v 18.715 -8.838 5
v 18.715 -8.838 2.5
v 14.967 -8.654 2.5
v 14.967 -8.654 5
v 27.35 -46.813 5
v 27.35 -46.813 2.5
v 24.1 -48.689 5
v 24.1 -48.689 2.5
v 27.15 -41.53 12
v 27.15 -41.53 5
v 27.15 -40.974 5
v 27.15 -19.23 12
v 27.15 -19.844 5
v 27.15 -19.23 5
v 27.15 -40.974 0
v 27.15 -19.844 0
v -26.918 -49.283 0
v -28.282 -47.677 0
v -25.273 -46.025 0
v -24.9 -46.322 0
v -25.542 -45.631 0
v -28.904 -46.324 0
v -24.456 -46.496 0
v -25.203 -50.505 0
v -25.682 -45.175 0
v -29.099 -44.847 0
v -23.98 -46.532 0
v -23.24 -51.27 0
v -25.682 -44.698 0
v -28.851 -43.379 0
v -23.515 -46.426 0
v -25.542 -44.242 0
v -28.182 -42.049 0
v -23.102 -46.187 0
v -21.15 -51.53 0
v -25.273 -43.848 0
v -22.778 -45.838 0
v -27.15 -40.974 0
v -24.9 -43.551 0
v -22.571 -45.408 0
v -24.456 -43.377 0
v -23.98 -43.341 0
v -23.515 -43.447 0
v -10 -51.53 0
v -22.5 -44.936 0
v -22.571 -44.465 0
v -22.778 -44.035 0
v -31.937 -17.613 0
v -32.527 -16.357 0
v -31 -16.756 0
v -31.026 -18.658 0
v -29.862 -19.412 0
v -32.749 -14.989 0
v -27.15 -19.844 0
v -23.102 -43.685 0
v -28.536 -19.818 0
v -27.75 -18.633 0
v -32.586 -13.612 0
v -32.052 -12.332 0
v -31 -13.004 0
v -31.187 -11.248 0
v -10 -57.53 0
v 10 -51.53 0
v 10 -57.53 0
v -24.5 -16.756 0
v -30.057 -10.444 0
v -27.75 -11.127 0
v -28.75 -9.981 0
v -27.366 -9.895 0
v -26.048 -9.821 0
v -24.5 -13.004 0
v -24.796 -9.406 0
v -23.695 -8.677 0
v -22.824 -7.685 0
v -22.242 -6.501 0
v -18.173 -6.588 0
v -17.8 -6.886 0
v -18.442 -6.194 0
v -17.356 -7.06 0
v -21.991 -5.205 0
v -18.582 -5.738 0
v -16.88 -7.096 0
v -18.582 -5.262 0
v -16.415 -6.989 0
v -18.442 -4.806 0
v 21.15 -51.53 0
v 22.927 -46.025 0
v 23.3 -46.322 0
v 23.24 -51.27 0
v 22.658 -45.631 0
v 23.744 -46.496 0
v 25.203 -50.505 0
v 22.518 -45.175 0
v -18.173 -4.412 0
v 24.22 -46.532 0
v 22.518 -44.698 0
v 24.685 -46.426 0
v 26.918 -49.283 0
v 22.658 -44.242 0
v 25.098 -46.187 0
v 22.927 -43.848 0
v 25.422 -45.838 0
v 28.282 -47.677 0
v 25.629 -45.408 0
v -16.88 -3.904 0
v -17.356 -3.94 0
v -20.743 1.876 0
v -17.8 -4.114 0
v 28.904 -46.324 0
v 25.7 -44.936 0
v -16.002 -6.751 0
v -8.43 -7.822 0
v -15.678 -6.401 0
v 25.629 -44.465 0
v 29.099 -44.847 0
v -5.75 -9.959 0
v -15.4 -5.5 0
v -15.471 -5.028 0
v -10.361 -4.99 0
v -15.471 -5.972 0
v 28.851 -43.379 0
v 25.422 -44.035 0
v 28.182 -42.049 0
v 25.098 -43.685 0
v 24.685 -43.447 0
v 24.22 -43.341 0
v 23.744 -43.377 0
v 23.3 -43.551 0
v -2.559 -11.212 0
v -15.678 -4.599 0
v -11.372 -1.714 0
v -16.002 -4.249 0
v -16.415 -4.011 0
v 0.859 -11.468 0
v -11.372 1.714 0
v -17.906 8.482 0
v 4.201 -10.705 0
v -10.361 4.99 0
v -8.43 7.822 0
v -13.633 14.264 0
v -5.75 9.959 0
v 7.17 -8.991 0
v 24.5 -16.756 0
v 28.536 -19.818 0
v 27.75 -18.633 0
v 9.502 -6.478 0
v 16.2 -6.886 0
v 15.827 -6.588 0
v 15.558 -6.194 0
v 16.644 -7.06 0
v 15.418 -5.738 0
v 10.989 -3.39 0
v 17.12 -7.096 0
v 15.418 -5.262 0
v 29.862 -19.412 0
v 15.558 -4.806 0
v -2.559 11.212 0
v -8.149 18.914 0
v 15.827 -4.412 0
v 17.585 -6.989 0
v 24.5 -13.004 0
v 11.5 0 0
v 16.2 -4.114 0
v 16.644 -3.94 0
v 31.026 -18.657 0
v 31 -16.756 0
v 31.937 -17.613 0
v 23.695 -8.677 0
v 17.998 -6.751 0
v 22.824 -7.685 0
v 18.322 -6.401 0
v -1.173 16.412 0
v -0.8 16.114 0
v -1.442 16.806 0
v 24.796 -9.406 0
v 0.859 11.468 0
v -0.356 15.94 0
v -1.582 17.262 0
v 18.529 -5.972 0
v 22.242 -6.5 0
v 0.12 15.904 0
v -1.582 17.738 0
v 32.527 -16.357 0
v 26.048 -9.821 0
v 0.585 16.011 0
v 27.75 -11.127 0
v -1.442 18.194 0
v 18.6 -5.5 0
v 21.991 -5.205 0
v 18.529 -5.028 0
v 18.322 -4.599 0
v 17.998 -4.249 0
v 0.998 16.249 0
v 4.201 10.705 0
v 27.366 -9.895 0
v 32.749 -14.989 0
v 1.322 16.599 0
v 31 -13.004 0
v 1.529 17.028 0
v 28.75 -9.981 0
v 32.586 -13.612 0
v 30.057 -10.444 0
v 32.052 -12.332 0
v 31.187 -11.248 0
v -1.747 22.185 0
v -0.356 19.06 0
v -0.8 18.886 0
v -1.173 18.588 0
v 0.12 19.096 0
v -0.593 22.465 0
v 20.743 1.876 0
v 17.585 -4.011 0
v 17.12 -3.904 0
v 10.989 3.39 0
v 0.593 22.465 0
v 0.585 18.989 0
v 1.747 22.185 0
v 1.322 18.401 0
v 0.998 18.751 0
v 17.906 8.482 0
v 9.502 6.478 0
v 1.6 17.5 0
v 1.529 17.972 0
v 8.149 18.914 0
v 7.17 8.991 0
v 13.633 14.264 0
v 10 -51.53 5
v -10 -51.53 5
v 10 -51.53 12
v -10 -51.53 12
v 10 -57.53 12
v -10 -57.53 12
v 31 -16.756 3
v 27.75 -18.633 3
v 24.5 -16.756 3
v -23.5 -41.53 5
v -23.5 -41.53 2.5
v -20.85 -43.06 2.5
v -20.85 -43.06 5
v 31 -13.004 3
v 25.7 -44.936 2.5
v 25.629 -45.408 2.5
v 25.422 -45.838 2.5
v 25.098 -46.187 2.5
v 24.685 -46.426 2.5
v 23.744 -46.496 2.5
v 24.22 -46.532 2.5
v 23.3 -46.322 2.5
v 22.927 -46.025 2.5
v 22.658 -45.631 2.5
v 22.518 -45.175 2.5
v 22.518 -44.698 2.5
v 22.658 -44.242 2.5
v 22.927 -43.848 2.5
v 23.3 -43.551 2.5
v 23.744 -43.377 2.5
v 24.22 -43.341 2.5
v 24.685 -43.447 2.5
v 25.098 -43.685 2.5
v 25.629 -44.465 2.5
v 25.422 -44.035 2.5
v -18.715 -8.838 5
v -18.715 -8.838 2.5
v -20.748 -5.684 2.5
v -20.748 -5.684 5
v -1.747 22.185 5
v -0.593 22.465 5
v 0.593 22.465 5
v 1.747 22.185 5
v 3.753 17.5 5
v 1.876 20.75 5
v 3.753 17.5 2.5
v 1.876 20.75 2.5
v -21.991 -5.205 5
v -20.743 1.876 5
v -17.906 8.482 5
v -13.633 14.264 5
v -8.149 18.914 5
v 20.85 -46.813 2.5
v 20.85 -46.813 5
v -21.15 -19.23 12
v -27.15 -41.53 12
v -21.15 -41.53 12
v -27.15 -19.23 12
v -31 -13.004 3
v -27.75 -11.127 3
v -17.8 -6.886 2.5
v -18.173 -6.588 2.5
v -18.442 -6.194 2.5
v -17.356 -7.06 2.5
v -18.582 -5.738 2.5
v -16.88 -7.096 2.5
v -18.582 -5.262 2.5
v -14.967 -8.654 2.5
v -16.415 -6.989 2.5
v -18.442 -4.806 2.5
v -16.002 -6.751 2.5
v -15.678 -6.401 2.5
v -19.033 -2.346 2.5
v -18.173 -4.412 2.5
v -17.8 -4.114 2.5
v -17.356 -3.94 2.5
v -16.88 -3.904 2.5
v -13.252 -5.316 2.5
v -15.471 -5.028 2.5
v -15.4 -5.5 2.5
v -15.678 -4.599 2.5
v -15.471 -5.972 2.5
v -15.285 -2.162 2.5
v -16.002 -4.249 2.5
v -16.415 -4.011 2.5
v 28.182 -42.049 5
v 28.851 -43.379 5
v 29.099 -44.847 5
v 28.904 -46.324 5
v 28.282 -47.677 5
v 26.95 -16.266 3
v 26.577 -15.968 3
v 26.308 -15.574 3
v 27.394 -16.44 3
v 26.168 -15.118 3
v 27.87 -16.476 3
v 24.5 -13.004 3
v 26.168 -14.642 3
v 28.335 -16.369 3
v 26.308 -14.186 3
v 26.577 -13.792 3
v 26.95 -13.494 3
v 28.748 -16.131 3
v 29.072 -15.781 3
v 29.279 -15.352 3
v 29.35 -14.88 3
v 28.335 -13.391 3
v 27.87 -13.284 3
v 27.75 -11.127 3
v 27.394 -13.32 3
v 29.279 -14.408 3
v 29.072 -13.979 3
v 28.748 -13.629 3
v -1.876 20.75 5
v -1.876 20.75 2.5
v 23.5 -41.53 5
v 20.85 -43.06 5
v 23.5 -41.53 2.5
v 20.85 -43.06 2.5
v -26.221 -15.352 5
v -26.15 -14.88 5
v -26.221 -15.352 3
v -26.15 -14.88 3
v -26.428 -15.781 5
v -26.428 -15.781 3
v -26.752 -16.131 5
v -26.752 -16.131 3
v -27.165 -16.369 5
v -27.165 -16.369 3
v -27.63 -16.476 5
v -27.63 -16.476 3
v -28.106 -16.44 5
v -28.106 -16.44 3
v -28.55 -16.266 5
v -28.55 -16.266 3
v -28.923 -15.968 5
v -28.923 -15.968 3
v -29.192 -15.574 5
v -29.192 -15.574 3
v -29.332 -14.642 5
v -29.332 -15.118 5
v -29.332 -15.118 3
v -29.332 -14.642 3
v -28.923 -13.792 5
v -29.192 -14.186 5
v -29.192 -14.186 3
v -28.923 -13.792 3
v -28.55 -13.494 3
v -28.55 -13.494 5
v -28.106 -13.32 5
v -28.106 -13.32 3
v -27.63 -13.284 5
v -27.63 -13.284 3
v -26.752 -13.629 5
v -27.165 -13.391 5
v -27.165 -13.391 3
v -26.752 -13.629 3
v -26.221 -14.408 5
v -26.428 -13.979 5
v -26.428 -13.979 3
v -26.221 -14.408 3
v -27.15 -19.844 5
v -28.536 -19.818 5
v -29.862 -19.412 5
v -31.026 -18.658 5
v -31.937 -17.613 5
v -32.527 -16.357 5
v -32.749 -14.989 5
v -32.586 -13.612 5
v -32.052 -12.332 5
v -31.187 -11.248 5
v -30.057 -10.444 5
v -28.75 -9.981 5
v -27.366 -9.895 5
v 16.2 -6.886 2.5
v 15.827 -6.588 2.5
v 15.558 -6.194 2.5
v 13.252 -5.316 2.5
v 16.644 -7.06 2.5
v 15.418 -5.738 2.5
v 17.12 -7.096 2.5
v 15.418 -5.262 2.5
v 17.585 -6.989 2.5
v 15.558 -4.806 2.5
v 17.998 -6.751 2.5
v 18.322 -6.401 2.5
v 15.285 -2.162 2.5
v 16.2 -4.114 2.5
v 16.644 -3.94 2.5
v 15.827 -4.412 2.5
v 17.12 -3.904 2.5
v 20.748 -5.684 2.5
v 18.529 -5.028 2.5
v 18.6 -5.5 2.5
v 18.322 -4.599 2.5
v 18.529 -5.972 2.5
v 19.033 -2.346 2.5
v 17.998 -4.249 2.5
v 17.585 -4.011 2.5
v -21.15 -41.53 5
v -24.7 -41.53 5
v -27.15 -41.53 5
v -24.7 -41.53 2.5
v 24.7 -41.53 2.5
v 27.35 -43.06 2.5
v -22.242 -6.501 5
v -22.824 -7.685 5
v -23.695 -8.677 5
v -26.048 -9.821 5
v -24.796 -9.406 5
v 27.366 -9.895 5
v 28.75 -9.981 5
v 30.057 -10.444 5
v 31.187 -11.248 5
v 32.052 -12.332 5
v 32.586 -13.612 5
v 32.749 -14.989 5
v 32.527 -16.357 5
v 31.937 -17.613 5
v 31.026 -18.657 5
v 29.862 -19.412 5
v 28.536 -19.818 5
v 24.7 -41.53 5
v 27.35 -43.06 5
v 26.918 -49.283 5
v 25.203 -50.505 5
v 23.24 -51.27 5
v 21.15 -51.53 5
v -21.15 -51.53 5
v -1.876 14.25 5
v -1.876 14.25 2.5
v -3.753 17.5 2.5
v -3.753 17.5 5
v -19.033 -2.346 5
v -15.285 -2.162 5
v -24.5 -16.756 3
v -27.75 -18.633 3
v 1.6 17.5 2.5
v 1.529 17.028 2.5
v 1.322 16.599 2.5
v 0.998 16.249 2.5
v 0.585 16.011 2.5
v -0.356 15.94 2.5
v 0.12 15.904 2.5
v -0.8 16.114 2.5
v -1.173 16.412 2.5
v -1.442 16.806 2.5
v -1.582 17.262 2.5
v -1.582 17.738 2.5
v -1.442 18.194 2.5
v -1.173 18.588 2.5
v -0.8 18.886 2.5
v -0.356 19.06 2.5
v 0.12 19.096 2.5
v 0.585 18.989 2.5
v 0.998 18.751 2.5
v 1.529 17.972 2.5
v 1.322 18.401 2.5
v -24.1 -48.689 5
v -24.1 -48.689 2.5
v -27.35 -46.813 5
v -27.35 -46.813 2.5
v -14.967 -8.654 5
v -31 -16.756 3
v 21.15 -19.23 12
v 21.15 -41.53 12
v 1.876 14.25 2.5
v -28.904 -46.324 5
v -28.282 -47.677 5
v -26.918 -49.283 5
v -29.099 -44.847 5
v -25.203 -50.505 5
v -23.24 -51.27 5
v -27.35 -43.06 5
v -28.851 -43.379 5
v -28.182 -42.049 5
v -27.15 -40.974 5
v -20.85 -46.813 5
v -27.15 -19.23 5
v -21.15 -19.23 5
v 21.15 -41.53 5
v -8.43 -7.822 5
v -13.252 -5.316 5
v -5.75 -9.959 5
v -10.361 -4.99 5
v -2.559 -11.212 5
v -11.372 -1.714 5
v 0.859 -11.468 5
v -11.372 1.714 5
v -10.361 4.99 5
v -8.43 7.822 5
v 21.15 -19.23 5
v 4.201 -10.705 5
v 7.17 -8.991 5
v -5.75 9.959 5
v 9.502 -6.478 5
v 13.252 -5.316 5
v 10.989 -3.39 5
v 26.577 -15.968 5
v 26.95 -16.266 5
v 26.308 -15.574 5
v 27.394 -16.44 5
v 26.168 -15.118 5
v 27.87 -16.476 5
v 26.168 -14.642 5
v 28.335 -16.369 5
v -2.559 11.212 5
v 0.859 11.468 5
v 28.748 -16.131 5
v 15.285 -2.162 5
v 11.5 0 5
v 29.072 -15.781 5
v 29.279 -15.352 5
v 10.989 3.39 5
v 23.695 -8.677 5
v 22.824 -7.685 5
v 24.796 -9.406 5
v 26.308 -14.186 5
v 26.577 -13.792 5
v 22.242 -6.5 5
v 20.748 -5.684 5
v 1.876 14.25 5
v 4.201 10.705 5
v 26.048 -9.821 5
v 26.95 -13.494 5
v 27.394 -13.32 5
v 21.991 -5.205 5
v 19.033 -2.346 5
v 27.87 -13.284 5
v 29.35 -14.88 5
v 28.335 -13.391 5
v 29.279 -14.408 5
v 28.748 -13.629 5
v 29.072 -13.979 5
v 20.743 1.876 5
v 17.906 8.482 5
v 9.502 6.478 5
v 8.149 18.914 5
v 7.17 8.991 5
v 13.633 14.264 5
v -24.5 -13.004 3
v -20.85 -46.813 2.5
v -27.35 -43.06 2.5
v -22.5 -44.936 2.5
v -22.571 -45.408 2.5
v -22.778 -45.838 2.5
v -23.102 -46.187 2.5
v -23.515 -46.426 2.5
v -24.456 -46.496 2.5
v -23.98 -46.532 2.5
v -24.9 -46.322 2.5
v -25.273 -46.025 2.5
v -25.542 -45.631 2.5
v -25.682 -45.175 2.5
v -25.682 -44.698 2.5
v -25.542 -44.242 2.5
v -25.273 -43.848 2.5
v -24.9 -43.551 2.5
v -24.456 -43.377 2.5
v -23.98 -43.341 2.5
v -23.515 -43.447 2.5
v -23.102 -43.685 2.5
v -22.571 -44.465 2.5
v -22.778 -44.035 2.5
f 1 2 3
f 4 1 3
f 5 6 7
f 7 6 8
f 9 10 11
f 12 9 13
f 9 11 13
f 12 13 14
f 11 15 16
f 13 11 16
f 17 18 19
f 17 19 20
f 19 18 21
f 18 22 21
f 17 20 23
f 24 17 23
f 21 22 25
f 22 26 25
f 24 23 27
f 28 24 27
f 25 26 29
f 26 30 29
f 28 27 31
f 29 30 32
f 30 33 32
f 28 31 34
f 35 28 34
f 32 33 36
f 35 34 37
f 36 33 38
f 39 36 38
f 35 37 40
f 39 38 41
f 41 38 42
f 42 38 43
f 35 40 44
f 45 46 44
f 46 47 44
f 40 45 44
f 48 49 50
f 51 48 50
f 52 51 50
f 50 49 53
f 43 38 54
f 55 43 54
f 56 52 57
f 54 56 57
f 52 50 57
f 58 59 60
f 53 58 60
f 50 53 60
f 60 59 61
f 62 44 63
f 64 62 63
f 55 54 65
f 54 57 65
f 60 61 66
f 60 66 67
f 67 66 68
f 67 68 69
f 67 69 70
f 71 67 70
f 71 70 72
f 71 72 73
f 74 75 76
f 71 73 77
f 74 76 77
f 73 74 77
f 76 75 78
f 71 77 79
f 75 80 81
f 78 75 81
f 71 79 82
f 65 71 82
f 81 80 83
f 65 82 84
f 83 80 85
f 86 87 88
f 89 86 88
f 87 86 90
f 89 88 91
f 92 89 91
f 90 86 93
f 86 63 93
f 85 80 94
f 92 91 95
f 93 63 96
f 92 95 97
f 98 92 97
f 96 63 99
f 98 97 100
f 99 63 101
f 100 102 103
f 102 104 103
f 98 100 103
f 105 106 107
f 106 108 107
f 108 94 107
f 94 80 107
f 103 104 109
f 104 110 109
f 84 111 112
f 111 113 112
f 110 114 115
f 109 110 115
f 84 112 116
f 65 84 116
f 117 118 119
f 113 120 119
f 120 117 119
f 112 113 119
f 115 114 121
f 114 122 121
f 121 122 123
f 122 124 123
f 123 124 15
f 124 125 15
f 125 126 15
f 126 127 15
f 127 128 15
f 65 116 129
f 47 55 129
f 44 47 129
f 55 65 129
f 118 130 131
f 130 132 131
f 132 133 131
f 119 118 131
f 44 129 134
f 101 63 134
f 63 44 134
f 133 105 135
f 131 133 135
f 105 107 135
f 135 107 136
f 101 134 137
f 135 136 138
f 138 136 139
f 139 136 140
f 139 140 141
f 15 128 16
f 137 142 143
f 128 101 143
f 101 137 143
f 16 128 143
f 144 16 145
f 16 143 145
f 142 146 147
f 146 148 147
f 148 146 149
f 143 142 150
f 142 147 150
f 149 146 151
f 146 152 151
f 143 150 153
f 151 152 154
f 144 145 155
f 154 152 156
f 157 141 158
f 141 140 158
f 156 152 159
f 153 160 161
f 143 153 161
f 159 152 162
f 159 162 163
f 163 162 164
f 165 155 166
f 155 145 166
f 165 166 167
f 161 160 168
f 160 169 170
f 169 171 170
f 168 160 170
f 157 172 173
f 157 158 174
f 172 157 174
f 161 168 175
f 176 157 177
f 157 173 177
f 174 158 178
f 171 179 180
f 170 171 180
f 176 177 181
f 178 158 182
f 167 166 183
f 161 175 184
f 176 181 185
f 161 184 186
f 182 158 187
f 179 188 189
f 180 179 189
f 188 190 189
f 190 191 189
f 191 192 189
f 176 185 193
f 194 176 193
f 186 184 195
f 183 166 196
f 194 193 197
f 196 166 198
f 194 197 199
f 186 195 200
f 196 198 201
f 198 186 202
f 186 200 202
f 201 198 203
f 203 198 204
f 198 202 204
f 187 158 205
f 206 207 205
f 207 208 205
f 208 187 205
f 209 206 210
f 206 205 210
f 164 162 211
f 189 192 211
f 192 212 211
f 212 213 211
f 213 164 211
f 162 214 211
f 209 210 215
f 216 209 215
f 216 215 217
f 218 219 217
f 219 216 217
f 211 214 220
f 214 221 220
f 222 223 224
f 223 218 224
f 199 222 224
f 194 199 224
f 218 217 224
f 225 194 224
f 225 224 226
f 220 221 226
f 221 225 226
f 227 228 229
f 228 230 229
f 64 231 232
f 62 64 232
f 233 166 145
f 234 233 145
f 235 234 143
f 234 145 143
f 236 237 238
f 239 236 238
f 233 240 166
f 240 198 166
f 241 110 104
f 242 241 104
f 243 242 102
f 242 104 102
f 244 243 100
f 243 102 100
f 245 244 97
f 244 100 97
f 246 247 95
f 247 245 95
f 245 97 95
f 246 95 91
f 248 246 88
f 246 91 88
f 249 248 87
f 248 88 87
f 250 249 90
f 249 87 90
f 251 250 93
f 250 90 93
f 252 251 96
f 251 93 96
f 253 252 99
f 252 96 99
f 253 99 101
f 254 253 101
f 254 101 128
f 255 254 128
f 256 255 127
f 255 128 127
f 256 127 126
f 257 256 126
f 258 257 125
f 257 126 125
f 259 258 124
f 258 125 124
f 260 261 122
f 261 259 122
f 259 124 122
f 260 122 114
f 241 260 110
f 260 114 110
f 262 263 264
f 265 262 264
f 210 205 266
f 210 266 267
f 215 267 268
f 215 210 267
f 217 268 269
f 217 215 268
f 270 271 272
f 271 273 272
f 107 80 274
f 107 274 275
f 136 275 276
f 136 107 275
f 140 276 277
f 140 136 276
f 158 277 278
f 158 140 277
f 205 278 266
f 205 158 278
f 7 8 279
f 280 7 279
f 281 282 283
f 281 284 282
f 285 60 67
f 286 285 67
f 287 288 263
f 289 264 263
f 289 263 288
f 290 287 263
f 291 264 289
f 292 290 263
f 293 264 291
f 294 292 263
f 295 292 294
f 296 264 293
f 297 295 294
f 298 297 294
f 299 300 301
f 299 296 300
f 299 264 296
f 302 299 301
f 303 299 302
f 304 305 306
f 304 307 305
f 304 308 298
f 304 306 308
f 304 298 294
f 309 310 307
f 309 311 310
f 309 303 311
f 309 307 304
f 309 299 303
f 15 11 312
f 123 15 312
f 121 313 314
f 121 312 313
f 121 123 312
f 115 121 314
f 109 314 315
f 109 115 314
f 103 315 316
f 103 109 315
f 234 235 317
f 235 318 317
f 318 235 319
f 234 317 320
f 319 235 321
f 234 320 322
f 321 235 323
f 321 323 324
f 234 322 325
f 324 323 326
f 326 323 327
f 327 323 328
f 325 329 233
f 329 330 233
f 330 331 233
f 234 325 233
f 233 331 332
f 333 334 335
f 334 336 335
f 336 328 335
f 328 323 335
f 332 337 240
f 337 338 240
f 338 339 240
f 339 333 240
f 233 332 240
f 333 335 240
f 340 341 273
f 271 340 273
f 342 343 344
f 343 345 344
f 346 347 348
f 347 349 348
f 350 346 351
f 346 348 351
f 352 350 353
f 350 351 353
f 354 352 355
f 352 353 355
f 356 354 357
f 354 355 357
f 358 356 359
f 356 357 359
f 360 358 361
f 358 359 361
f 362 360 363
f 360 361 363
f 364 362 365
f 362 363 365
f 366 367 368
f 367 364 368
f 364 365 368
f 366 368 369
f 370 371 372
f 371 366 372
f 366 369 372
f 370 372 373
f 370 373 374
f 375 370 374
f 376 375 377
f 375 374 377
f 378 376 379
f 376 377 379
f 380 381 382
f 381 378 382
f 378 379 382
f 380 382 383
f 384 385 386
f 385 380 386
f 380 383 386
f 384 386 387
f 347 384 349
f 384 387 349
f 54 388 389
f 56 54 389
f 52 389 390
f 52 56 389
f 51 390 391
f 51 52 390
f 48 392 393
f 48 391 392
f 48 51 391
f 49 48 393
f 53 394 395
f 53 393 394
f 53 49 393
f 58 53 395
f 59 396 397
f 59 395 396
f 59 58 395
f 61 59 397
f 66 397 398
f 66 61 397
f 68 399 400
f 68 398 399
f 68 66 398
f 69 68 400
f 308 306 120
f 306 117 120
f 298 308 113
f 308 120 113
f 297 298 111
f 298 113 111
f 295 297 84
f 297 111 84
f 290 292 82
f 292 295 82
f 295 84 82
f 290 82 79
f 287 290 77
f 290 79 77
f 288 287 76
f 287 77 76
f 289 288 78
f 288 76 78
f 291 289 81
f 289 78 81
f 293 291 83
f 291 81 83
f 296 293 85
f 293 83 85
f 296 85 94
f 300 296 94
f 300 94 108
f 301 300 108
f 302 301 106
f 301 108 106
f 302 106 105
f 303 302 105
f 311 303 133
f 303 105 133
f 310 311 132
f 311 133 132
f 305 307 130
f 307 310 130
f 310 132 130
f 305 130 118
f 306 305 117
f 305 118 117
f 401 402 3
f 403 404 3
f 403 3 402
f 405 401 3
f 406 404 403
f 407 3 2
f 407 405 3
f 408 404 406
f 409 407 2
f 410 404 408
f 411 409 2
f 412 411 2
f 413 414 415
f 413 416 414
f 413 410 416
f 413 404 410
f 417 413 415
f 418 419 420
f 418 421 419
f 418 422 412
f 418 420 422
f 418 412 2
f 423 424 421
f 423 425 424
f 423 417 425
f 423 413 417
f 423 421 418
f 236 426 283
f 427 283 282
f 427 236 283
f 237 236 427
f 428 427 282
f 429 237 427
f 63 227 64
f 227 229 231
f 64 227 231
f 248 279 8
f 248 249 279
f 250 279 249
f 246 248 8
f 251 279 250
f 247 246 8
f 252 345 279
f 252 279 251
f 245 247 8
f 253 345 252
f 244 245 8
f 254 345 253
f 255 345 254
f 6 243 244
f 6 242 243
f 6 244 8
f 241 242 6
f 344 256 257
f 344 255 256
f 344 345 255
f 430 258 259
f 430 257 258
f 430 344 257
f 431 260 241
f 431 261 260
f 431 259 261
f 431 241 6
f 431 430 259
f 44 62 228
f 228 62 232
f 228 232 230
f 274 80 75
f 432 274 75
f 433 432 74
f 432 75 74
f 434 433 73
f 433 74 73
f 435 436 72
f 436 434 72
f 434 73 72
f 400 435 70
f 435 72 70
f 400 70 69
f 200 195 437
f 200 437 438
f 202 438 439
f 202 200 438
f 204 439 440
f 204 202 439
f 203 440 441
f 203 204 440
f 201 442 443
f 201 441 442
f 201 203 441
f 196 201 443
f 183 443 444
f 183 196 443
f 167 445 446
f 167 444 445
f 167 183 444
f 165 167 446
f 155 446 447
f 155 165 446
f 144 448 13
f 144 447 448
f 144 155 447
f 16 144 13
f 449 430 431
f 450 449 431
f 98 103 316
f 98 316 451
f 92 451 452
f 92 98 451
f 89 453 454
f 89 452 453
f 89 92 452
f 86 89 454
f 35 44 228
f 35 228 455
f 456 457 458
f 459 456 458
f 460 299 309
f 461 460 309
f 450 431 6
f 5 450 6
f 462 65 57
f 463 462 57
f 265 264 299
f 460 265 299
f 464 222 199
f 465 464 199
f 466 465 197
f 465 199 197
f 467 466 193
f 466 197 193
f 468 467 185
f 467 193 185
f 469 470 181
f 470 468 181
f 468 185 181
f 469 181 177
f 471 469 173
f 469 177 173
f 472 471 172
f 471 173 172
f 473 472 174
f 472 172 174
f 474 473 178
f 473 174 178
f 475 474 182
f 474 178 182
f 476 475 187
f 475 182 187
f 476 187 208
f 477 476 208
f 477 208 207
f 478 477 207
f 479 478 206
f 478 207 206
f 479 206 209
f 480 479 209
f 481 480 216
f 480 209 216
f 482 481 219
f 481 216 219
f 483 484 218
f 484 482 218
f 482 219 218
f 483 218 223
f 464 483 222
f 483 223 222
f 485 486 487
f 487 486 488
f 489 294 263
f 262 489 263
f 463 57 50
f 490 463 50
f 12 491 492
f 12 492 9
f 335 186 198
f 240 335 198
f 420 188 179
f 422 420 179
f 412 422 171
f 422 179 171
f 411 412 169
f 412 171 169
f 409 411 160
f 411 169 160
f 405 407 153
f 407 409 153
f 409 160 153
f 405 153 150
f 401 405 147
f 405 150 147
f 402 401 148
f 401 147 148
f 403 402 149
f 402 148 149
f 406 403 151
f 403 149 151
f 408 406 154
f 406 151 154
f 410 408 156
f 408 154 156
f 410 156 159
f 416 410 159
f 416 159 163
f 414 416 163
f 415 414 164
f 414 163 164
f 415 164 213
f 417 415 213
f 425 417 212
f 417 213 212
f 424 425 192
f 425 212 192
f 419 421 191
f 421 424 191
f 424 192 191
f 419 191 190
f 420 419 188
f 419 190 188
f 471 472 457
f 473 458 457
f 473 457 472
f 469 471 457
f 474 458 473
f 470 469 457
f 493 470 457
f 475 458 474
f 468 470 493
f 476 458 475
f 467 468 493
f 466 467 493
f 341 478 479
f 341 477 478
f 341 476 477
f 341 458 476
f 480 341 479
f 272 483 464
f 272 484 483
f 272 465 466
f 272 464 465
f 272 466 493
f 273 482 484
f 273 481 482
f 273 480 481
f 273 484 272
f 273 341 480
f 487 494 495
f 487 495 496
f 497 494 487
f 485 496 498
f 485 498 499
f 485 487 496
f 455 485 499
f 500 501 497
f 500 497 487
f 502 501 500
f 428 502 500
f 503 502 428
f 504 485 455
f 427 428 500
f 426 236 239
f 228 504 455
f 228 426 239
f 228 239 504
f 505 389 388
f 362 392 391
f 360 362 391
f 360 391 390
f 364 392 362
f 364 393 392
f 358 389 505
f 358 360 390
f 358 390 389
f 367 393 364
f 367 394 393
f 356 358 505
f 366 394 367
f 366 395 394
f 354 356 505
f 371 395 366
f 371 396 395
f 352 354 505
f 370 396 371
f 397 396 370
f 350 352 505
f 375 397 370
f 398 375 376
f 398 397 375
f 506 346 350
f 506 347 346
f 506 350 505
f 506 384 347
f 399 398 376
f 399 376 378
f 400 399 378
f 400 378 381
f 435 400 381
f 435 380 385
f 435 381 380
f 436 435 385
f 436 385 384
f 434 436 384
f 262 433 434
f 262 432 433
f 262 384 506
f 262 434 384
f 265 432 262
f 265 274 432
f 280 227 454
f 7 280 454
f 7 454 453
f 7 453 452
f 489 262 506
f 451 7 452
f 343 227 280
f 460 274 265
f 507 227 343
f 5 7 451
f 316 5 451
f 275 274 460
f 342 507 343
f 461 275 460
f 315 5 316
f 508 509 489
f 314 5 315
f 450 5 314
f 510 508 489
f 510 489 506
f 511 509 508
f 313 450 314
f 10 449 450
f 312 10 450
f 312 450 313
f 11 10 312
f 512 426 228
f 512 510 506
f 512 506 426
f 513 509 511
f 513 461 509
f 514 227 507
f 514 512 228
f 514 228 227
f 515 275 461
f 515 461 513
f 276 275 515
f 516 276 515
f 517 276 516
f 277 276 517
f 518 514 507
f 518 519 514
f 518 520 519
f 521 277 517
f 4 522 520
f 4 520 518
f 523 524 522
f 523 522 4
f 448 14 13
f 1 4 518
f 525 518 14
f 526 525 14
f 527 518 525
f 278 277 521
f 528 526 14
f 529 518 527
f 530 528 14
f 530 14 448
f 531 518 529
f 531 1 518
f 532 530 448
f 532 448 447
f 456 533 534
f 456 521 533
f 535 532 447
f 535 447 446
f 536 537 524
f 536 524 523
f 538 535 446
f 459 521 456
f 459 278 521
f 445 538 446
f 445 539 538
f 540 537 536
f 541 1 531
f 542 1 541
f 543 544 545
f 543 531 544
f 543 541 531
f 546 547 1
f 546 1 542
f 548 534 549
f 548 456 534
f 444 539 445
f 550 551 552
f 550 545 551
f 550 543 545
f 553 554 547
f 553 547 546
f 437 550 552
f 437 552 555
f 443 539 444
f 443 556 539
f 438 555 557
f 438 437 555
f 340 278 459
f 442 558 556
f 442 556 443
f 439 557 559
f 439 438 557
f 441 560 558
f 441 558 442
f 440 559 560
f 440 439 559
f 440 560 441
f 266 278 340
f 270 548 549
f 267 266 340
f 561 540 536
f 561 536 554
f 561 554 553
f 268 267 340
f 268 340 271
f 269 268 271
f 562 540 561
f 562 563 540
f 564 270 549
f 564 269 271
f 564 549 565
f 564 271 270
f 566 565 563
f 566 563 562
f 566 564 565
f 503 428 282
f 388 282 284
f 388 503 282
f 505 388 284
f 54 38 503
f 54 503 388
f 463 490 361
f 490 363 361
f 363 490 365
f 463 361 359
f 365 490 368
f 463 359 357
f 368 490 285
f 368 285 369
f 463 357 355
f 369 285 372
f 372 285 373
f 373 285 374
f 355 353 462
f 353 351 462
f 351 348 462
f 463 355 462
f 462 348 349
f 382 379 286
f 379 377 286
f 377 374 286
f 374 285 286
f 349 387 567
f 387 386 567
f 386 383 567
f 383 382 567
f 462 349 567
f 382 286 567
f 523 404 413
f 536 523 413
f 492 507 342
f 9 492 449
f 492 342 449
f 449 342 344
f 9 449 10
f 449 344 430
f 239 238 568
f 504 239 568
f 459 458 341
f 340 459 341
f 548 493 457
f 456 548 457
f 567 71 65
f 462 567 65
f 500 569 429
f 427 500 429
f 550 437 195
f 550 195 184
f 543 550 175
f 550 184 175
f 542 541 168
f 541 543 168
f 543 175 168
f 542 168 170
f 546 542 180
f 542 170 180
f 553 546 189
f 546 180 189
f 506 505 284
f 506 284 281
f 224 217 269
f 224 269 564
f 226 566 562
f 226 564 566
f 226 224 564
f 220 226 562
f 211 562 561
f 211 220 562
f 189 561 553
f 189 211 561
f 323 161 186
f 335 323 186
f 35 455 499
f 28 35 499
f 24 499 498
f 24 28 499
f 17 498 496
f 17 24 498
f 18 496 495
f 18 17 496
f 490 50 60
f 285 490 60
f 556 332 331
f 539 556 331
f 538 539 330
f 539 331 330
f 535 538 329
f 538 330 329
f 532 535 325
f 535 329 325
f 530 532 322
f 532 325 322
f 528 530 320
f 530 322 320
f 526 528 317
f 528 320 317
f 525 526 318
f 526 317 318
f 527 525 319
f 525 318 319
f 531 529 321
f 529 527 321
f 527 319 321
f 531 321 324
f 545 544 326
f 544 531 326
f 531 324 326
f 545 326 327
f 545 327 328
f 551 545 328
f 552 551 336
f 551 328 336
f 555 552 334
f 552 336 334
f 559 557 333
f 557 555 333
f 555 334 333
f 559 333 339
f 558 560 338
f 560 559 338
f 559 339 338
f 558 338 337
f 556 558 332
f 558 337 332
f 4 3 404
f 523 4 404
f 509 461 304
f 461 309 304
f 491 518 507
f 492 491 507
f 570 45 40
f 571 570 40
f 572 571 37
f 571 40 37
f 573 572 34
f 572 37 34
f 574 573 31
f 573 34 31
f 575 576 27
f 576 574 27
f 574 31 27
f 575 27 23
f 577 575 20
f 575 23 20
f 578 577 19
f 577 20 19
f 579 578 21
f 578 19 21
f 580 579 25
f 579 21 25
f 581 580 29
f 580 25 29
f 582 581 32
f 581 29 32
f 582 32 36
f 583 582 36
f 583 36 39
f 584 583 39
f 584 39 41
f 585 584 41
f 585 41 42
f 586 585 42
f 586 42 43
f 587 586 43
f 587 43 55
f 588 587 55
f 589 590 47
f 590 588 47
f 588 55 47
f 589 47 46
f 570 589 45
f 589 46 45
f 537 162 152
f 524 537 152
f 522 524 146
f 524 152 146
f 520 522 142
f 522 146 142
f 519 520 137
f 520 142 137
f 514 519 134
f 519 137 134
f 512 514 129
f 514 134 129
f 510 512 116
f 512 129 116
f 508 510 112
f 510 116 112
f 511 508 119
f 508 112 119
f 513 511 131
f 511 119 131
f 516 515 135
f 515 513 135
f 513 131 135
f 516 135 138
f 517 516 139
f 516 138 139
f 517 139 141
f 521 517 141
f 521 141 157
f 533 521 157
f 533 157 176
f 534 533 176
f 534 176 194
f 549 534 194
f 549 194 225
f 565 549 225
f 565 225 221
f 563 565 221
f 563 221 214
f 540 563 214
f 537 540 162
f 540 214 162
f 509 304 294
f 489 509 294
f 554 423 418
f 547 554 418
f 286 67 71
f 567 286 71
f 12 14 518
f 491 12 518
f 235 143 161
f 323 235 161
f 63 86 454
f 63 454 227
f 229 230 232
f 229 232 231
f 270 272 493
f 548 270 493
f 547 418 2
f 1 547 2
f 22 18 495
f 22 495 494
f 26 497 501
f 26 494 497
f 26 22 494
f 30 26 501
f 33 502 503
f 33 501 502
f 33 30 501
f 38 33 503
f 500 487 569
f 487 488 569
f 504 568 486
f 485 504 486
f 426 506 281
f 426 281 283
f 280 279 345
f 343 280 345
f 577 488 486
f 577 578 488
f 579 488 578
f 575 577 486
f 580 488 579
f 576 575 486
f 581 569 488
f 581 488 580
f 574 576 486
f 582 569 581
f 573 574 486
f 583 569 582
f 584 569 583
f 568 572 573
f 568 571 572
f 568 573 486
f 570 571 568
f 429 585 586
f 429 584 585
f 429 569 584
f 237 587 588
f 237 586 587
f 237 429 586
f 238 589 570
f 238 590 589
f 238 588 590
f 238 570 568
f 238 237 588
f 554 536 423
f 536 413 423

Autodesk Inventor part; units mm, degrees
ref_plane "YZ Plane" through (0, 0, 0) normal (1, 0, 0) x (0, 1, 0)
ref_plane "XZ Plane" through (0, 0, 0) normal (0, 1, 0) x (-1, 0, 0)
ref_plane "XY Plane" through (0, 0, 0) normal (0, 0, 1) x (1, 0, 0)
sketch "Sketch1" plane through (0, 0, 0) normal (0, 0, 1) x (1, 0, 0)
  circle A0 centre (0, 0) radius 11.5
  line L0 (21.15, -51.53) -> (-21.15, -51.53) construction
  line L1 (-21.15, -51.53) -> (-21.15, -9.23) construction
  line L2 (-21.15, -9.23) -> (21.15, -9.23) construction
  line L3 (21.15, -9.23) -> (21.15, -51.53) construction
  circle A1 centre (0, 17.5) radius 1.6
  circle A2 centre (17, -5.5) radius 1.6
  circle A3 centre (-17, -5.5) radius 1.6
  line L4 (13.2517, -5.3162) -> (15.2851, -2.162)
  line L5 (15.2851, -2.162) -> (19.0333, -2.3458)
  line L6 (19.0333, -2.3458) -> (20.7483, -5.6838)
  line L7 (20.7483, -5.6838) -> (18.7149, -8.838)
  line L8 (18.7149, -8.838) -> (14.9667, -8.6542)
  line L9 (14.9667, -8.6542) -> (13.2517, -5.3162)
  line L10 (-14.9667, -8.6542) -> (-18.7149, -8.838)
  line L11 (-18.7149, -8.838) -> (-20.7483, -5.6838)
  line L12 (-20.7483, -5.6838) -> (-19.0333, -2.3458)
  line L13 (-19.0333, -2.3458) -> (-15.2851, -2.162)
  line L14 (-15.2851, -2.162) -> (-13.2517, -5.3162)
  line L15 (-13.2517, -5.3162) -> (-14.9667, -8.6542)
  line L16 (-1.8764, 14.25) -> (-3.7528, 17.5)
  line L17 (-3.7528, 17.5) -> (-1.8764, 20.75)
  line L18 (-1.8764, 20.75) -> (1.8764, 20.75)
  line L19 (1.8764, 20.75) -> (3.7528, 17.5)
  line L20 (3.7528, 17.5) -> (1.8764, 14.25)
  line L21 (1.8764, 14.25) -> (-1.8764, 14.25)
  line L22 (0, 0) -> (0, 17.5) construction
  line L23 (14.9667, -8.6542) -> (14.9667, -9.23) construction
  line L24 (13.2517, -5.3162) -> (12.7488, -5.0358) construction
  line L25 (21.15, -41.53) -> (27.15, -41.53)
  line L26 (27.15, -41.53) -> (27.15, -19.23)
  line L27 (27.15, -19.23) -> (21.15, -19.23)
  line L28 (21.15, -19.23) -> (21.15, -41.53)
  line L29 (-21.15, -41.53) -> (-27.15, -41.53)
  line L30 (-27.15, -41.53) -> (-27.15, -19.23)
  line L31 (-27.15, -19.23) -> (-21.15, -19.23)
  line L32 (-21.15, -19.23) -> (-21.15, -41.53)
  circle A4 centre (27.75, -14.88) radius 1.6
  circle A5 centre (-27.75, -14.88) radius 1.6
  line L33 (24.5, -16.7564) -> (24.5, -13.0036)
  line L34 (24.5, -13.0036) -> (27.75, -11.1272)
  line L35 (27.75, -11.1272) -> (31, -13.0036)
  line L36 (31, -13.0036) -> (31, -16.7564)
  line L37 (31, -16.7564) -> (27.75, -18.6328)
  line L38 (27.75, -18.6328) -> (24.5, -16.7564)
  line L39 (-27.75, -18.6328) -> (-31, -16.7564)
  line L40 (-31, -16.7564) -> (-31, -13.0036)
  line L41 (-31, -13.0036) -> (-27.75, -11.1272)
  line L42 (-27.75, -11.1272) -> (-24.5, -13.0036)
  line L43 (-24.5, -13.0036) -> (-24.5, -16.7564)
  line L44 (-24.5, -16.7564) -> (-27.75, -18.6328)
  circle A6 centre (-24.1, -44.9364) radius 1.6
  circle A7 centre (24.1, -44.9364) radius 1.6
  line L45 (-24.1, -48.6891) -> (-27.35, -46.8128)
  line L46 (-27.35, -46.8128) -> (-27.35, -43.06)
  line L47 (-27.35, -43.06) -> (-24.1, -41.1836)
  line L48 (-24.1, -41.1836) -> (-20.85, -43.06)
  line L49 (-20.85, -43.06) -> (-20.85, -46.8128)
  line L50 (-20.85, -46.8128) -> (-24.1, -48.6891)
  line L51 (24.1, -48.6891) -> (20.85, -46.8128)
  line L52 (20.85, -46.8128) -> (20.85, -43.06)
  line L53 (20.85, -43.06) -> (24.1, -41.1836)
  line L54 (24.1, -41.1836) -> (27.35, -43.06)
  line L55 (27.35, -43.06) -> (27.35, -46.8128)
  line L56 (27.35, -46.8128) -> (24.1, -48.6891)
  arc A8 (-27.3663, -9.8947) -> (-27.15, -19.8439) centre (-27.75, -14.88) ccw
  arc A9 (27.15, -19.8439) -> (27.3663, -9.8947) centre (27.75, -14.88) ccw
  arc A10 (-27.15, -40.9744) -> (-28.2818, -47.6773) centre (-24.1, -44.9364) ccw
  arc A11 (28.2818, -47.6773) -> (27.15, -40.9744) centre (24.1, -44.9364) ccw
  line L57 (21.15, -48.9734) -> (21.15, -51.53)
  line L58 (21.15, -51.53) -> (-21.15, -51.53)
  line L59 (-21.15, -51.53) -> (-21.15, -48.9734)
  arc A12 (1.7467, 22.185) -> (-1.7467, 22.185) centre (0, 17.5) ccw
  arc A13 (-27.3663, -9.8947) -> (-21.9913, -5.2047) centre (-26.9825, -4.9095) ccw
  arc A14 (21.9913, -5.2047) -> (27.3663, -9.8947) centre (26.9825, -4.9095) ccw
  arc A15 (21.15, -51.53) -> (28.2818, -47.6773) centre (21.15, -43.0028) ccw
  arc A16 (-28.2818, -47.6773) -> (-21.15, -51.53) centre (-21.15, -43.0028) ccw
  arc A17 (-1.7467, 22.185) -> (-21.9913, -5.2047) centre (9.1518, -7.047) ccw
  arc A18 (21.9913, -5.2047) -> (1.7467, 22.185) centre (-9.1518, -7.047) ccw
  dimension "d1" = 23
  dimension "d19" = 9.23
  dimension "d20" = 42.3
  dimension "d21" = 21.15
  dimension "d22" = 42.3
  dimension "d23" = 3.2
  dimension "d24" = 3.2
  dimension "d25" = 3.2
  dimension "d26" = 5.5
  dimension "d27" = 17
  dimension "d28" = 5.5
  dimension "d29" = 17
  dimension "d30" = 6.5
  dimension "d31" = 17.5
  dimension "d32" = 6.5
  dimension "d33" = 6.5
  dimension "d35" = 0.5758
  dimension "d36" = 0.5758
  dimension "d37" = 6
  dimension "d38" = 10
  dimension "d39" = 10
  dimension "d40" = 6
  dimension "d41" = 3.2
  dimension "d42" = 3.2
  dimension "d43" = 5.65
  dimension "d44" = 6.6
  dimension "d45" = 6.6
  dimension "d46" = 5.65
  dimension "d47" = 6.5
  dimension "d48" = 6.5
  dimension "d49" = 3.2
  dimension "d50" = 3.2
  dimension "d52" = 2.95
  dimension "d53" = 2.95
  dimension "d56" = 10
  dimension "d57" = 10
  dimension "d58" = 10
  dimension "d59" = 10
  dimension "d61" = 10
  dimension "d63" = 10
  dimension "d64" = 10
  dimension "d90" = 3.4064
  dimension "d91" = 3.4064
  dimension "d92" = 6.5
  dimension "d93" = 6.5
extrude "Extrusion5" add sketch "Sketch1" along normal blind 5 contours L25 L53 L52 L51 L56 L55 L54 L26 A11 A15 L58 A16 A10 L30 L29 L47 L46 L45 L50 L49 L48 L32 L31 A8 A13 A17 A12 A18 A14 A9 L27 L28 | L33 L34 L35 L36 L37 L38 | L39 L40 L41 L42 L43 L44
extrude "Extrusion6" add sketch "Sketch1" along normal blind 12 contours L28 L27 L26 L25 L54 L53 | L53 L54 L25 | L30 L31 L32 L29 L48 L47 | L47 L48 L29
extrude "Extrusion7" add sketch "Sketch1" along normal blind 2.5 contours L4 L5 L6 L7 L8 L9 | L10 L11 L12 L13 L14 L15 | L16 L17 L18 L19 L20 L21 | L53 L54 L25 | L25 L54 L55 L56 L51 L52 L53 | L47 L48 L29 | L29 L48 L49 L50 L45 L46 L47
extrude "Extrusion8" cut sketch "Sketch1" along normal blind 3 contours L33 L34 L35 L36 L37 L38 | L39 L40 L41 L42 L43 L44
sketch "Sketch2" plane through (0, 0, 5) normal (0, 0, 1) x (1, 0, 0)
  circle A0 centre (0, 17.5) radius 1.6 projected
  circle A1 centre (-17, -5.5) radius 1.6 projected
  circle A2 centre (-17, -5.5) radius 1.6 projected
  circle A3 centre (-24.1, -44.9364) radius 1.6 projected
  circle A4 centre (24.1, -44.9364) radius 1.6 projected
  circle A5 centre (24.1, -44.9364) radius 1.6 projected
  circle A6 centre (17, -5.5) radius 1.6 projected
  circle A7 centre (17, -5.5) radius 1.6 projected
  circle A8 centre (0, 0) radius 11.5 projected
  circle A9 centre (0, 0) radius 11.5 projected
  dimension "d77" = 23
  dimension "d78" = 17.5
  dimension "d79" = 34
  dimension "d80" = 5.5
  dimension "d81" = 48.2
  dimension "d82" = 44.9364
sketch "Sketch3" plane through (0, 0, 5) normal (0, 0, 1) x (1, 0, 0)
  circle A0 centre (-27.75, -14.88) radius 1.6 projected
  circle A1 centre (27.75, -14.88) radius 1.6 projected
  circle A2 centre (0, 0) radius 11.5 projected
  line L0 (-3.7528, 17.5) -> (-1.8764, 20.75) projected
  line L1 (-1.8764, 20.75) -> (1.8764, 20.75) projected
  line L2 (1.8764, 20.75) -> (3.7528, 17.5) projected
  line L3 (3.7528, 17.5) -> (1.8764, 14.25) projected
  line L4 (1.8764, 14.25) -> (-1.8764, 14.25) projected
  line L5 (-1.8764, 14.25) -> (-3.7528, 17.5) projected
  line L6 (-18.7149, -8.838) -> (-20.7483, -5.6838) projected
  line L7 (-20.7483, -5.6838) -> (-19.0333, -2.3458) projected
  line L8 (-19.0333, -2.3458) -> (-15.2851, -2.162) projected
  line L9 (-15.2851, -2.162) -> (-13.2517, -5.3162) projected
  line L10 (-13.2517, -5.3162) -> (-14.9667, -8.6542) projected
  line L11 (-14.9667, -8.6542) -> (-18.7149, -8.838) projected
  line L12 (15.2851, -2.162) -> (19.0333, -2.3458) projected
  line L13 (19.0333, -2.3458) -> (20.7483, -5.6838) projected
  line L14 (20.7483, -5.6838) -> (18.7149, -8.838) projected
  line L15 (18.7149, -8.838) -> (14.9667, -8.6542) projected
  line L16 (14.9667, -8.6542) -> (13.2517, -5.3162) projected
  line L17 (13.2517, -5.3162) -> (15.2851, -2.162) projected
  arc A3 (21.15, -51.53) -> (28.2818, -47.6773) centre (21.15, -43.0028) ccw projected
  arc A4 (28.2818, -47.6773) -> (27.15, -40.9744) centre (24.1, -44.9364) ccw projected
  line L18 (27.15, -40.9744) -> (27.15, -41.53) projected
  line L19 (27.15, -41.53) -> (24.7, -41.53) projected
  line L20 (24.7, -41.53) -> (27.35, -43.06) projected
  line L21 (27.35, -43.06) -> (27.35, -46.8128) projected
  line L22 (27.35, -46.8128) -> (24.1, -48.6891) projected
  line L23 (24.1, -48.6891) -> (20.85, -46.8128) projected
  line L24 (20.85, -46.8128) -> (20.85, -43.06) projected
  line L25 (20.85, -43.06) -> (23.5, -41.53) projected
  line L26 (21.15, -41.53) -> (21.15, -19.23) projected
  line L27 (21.15, -19.23) -> (27.15, -19.23) projected
  line L28 (27.15, -19.23) -> (27.15, -19.8439) projected
  arc A5 (27.15, -19.8439) -> (27.3663, -9.8947) centre (27.75, -14.88) ccw projected
  arc A6 (21.9913, -5.2047) -> (27.3663, -9.8947) centre (26.9825, -4.9095) ccw projected
  arc A7 (21.9913, -5.2047) -> (1.7467, 22.185) centre (-9.1518, -7.047) ccw projected
  arc A8 (1.7467, 22.185) -> (-1.7467, 22.185) centre (0, 17.5) ccw projected
  arc A9 (-1.7467, 22.185) -> (-21.9913, -5.2047) centre (9.1518, -7.047) ccw projected
  arc A10 (-27.3663, -9.8947) -> (-21.9913, -5.2047) centre (-26.9825, -4.9095) ccw projected
  arc A11 (-27.3663, -9.8947) -> (-27.15, -19.8439) centre (-27.75, -14.88) ccw projected
  line L29 (-27.15, -19.8439) -> (-27.15, -19.23) projected
  line L30 (-27.15, -19.23) -> (-21.15, -19.23) projected
  line L31 (-21.15, -19.23) -> (-21.15, -41.53) projected
  line L32 (-24.7, -41.53) -> (-27.15, -41.53) projected
  line L33 (-23.5, -41.53) -> (-20.85, -43.06) projected
  line L34 (-20.85, -43.06) -> (-20.85, -46.8128) projected
  line L35 (-20.85, -46.8128) -> (-24.1, -48.6891) projected
  line L36 (-24.1, -48.6891) -> (-27.35, -46.8128) projected
  line L37 (-27.35, -46.8128) -> (-27.35, -43.06) projected
  line L38 (-27.35, -43.06) -> (-24.7, -41.53) projected
  line L39 (-27.15, -41.53) -> (-27.15, -40.9744) projected
  arc A12 (-27.15, -40.9744) -> (-28.2818, -47.6773) centre (-24.1, -44.9364) ccw projected
  arc A13 (-28.2818, -47.6773) -> (-21.15, -51.53) centre (-21.15, -43.0028) ccw projected
  line L40 (-21.15, -51.53) -> (21.15, -51.53) projected
  line L41 (-21.15, -51.53) -> (21.15, -51.53) projected
  line L42 (-10, -51.53) -> (10, -51.53)
  line L43 (10, -51.53) -> (10, -57.53)
  line L44 (10, -57.53) -> (-10, -57.53)
  line L45 (-10, -57.53) -> (-10, -51.53)
  line L46 (23.5, -41.53) -> (21.15, -41.53) projected
  line L47 (-21.15, -41.53) -> (-23.5, -41.53) projected
  dimension "d83" = 6
  dimension "d84" = 20
  dimension "d85" = 10
extrude "Extrusion9" add sketch "Sketch3" against normal blind 5 and the other way blind 7 contours L43 L44 L45 L40
equation "\"d21\" = 0.5 * d20"
equation "\"d22\" = d20"
properties part number "BallBearingHolderBottom"
